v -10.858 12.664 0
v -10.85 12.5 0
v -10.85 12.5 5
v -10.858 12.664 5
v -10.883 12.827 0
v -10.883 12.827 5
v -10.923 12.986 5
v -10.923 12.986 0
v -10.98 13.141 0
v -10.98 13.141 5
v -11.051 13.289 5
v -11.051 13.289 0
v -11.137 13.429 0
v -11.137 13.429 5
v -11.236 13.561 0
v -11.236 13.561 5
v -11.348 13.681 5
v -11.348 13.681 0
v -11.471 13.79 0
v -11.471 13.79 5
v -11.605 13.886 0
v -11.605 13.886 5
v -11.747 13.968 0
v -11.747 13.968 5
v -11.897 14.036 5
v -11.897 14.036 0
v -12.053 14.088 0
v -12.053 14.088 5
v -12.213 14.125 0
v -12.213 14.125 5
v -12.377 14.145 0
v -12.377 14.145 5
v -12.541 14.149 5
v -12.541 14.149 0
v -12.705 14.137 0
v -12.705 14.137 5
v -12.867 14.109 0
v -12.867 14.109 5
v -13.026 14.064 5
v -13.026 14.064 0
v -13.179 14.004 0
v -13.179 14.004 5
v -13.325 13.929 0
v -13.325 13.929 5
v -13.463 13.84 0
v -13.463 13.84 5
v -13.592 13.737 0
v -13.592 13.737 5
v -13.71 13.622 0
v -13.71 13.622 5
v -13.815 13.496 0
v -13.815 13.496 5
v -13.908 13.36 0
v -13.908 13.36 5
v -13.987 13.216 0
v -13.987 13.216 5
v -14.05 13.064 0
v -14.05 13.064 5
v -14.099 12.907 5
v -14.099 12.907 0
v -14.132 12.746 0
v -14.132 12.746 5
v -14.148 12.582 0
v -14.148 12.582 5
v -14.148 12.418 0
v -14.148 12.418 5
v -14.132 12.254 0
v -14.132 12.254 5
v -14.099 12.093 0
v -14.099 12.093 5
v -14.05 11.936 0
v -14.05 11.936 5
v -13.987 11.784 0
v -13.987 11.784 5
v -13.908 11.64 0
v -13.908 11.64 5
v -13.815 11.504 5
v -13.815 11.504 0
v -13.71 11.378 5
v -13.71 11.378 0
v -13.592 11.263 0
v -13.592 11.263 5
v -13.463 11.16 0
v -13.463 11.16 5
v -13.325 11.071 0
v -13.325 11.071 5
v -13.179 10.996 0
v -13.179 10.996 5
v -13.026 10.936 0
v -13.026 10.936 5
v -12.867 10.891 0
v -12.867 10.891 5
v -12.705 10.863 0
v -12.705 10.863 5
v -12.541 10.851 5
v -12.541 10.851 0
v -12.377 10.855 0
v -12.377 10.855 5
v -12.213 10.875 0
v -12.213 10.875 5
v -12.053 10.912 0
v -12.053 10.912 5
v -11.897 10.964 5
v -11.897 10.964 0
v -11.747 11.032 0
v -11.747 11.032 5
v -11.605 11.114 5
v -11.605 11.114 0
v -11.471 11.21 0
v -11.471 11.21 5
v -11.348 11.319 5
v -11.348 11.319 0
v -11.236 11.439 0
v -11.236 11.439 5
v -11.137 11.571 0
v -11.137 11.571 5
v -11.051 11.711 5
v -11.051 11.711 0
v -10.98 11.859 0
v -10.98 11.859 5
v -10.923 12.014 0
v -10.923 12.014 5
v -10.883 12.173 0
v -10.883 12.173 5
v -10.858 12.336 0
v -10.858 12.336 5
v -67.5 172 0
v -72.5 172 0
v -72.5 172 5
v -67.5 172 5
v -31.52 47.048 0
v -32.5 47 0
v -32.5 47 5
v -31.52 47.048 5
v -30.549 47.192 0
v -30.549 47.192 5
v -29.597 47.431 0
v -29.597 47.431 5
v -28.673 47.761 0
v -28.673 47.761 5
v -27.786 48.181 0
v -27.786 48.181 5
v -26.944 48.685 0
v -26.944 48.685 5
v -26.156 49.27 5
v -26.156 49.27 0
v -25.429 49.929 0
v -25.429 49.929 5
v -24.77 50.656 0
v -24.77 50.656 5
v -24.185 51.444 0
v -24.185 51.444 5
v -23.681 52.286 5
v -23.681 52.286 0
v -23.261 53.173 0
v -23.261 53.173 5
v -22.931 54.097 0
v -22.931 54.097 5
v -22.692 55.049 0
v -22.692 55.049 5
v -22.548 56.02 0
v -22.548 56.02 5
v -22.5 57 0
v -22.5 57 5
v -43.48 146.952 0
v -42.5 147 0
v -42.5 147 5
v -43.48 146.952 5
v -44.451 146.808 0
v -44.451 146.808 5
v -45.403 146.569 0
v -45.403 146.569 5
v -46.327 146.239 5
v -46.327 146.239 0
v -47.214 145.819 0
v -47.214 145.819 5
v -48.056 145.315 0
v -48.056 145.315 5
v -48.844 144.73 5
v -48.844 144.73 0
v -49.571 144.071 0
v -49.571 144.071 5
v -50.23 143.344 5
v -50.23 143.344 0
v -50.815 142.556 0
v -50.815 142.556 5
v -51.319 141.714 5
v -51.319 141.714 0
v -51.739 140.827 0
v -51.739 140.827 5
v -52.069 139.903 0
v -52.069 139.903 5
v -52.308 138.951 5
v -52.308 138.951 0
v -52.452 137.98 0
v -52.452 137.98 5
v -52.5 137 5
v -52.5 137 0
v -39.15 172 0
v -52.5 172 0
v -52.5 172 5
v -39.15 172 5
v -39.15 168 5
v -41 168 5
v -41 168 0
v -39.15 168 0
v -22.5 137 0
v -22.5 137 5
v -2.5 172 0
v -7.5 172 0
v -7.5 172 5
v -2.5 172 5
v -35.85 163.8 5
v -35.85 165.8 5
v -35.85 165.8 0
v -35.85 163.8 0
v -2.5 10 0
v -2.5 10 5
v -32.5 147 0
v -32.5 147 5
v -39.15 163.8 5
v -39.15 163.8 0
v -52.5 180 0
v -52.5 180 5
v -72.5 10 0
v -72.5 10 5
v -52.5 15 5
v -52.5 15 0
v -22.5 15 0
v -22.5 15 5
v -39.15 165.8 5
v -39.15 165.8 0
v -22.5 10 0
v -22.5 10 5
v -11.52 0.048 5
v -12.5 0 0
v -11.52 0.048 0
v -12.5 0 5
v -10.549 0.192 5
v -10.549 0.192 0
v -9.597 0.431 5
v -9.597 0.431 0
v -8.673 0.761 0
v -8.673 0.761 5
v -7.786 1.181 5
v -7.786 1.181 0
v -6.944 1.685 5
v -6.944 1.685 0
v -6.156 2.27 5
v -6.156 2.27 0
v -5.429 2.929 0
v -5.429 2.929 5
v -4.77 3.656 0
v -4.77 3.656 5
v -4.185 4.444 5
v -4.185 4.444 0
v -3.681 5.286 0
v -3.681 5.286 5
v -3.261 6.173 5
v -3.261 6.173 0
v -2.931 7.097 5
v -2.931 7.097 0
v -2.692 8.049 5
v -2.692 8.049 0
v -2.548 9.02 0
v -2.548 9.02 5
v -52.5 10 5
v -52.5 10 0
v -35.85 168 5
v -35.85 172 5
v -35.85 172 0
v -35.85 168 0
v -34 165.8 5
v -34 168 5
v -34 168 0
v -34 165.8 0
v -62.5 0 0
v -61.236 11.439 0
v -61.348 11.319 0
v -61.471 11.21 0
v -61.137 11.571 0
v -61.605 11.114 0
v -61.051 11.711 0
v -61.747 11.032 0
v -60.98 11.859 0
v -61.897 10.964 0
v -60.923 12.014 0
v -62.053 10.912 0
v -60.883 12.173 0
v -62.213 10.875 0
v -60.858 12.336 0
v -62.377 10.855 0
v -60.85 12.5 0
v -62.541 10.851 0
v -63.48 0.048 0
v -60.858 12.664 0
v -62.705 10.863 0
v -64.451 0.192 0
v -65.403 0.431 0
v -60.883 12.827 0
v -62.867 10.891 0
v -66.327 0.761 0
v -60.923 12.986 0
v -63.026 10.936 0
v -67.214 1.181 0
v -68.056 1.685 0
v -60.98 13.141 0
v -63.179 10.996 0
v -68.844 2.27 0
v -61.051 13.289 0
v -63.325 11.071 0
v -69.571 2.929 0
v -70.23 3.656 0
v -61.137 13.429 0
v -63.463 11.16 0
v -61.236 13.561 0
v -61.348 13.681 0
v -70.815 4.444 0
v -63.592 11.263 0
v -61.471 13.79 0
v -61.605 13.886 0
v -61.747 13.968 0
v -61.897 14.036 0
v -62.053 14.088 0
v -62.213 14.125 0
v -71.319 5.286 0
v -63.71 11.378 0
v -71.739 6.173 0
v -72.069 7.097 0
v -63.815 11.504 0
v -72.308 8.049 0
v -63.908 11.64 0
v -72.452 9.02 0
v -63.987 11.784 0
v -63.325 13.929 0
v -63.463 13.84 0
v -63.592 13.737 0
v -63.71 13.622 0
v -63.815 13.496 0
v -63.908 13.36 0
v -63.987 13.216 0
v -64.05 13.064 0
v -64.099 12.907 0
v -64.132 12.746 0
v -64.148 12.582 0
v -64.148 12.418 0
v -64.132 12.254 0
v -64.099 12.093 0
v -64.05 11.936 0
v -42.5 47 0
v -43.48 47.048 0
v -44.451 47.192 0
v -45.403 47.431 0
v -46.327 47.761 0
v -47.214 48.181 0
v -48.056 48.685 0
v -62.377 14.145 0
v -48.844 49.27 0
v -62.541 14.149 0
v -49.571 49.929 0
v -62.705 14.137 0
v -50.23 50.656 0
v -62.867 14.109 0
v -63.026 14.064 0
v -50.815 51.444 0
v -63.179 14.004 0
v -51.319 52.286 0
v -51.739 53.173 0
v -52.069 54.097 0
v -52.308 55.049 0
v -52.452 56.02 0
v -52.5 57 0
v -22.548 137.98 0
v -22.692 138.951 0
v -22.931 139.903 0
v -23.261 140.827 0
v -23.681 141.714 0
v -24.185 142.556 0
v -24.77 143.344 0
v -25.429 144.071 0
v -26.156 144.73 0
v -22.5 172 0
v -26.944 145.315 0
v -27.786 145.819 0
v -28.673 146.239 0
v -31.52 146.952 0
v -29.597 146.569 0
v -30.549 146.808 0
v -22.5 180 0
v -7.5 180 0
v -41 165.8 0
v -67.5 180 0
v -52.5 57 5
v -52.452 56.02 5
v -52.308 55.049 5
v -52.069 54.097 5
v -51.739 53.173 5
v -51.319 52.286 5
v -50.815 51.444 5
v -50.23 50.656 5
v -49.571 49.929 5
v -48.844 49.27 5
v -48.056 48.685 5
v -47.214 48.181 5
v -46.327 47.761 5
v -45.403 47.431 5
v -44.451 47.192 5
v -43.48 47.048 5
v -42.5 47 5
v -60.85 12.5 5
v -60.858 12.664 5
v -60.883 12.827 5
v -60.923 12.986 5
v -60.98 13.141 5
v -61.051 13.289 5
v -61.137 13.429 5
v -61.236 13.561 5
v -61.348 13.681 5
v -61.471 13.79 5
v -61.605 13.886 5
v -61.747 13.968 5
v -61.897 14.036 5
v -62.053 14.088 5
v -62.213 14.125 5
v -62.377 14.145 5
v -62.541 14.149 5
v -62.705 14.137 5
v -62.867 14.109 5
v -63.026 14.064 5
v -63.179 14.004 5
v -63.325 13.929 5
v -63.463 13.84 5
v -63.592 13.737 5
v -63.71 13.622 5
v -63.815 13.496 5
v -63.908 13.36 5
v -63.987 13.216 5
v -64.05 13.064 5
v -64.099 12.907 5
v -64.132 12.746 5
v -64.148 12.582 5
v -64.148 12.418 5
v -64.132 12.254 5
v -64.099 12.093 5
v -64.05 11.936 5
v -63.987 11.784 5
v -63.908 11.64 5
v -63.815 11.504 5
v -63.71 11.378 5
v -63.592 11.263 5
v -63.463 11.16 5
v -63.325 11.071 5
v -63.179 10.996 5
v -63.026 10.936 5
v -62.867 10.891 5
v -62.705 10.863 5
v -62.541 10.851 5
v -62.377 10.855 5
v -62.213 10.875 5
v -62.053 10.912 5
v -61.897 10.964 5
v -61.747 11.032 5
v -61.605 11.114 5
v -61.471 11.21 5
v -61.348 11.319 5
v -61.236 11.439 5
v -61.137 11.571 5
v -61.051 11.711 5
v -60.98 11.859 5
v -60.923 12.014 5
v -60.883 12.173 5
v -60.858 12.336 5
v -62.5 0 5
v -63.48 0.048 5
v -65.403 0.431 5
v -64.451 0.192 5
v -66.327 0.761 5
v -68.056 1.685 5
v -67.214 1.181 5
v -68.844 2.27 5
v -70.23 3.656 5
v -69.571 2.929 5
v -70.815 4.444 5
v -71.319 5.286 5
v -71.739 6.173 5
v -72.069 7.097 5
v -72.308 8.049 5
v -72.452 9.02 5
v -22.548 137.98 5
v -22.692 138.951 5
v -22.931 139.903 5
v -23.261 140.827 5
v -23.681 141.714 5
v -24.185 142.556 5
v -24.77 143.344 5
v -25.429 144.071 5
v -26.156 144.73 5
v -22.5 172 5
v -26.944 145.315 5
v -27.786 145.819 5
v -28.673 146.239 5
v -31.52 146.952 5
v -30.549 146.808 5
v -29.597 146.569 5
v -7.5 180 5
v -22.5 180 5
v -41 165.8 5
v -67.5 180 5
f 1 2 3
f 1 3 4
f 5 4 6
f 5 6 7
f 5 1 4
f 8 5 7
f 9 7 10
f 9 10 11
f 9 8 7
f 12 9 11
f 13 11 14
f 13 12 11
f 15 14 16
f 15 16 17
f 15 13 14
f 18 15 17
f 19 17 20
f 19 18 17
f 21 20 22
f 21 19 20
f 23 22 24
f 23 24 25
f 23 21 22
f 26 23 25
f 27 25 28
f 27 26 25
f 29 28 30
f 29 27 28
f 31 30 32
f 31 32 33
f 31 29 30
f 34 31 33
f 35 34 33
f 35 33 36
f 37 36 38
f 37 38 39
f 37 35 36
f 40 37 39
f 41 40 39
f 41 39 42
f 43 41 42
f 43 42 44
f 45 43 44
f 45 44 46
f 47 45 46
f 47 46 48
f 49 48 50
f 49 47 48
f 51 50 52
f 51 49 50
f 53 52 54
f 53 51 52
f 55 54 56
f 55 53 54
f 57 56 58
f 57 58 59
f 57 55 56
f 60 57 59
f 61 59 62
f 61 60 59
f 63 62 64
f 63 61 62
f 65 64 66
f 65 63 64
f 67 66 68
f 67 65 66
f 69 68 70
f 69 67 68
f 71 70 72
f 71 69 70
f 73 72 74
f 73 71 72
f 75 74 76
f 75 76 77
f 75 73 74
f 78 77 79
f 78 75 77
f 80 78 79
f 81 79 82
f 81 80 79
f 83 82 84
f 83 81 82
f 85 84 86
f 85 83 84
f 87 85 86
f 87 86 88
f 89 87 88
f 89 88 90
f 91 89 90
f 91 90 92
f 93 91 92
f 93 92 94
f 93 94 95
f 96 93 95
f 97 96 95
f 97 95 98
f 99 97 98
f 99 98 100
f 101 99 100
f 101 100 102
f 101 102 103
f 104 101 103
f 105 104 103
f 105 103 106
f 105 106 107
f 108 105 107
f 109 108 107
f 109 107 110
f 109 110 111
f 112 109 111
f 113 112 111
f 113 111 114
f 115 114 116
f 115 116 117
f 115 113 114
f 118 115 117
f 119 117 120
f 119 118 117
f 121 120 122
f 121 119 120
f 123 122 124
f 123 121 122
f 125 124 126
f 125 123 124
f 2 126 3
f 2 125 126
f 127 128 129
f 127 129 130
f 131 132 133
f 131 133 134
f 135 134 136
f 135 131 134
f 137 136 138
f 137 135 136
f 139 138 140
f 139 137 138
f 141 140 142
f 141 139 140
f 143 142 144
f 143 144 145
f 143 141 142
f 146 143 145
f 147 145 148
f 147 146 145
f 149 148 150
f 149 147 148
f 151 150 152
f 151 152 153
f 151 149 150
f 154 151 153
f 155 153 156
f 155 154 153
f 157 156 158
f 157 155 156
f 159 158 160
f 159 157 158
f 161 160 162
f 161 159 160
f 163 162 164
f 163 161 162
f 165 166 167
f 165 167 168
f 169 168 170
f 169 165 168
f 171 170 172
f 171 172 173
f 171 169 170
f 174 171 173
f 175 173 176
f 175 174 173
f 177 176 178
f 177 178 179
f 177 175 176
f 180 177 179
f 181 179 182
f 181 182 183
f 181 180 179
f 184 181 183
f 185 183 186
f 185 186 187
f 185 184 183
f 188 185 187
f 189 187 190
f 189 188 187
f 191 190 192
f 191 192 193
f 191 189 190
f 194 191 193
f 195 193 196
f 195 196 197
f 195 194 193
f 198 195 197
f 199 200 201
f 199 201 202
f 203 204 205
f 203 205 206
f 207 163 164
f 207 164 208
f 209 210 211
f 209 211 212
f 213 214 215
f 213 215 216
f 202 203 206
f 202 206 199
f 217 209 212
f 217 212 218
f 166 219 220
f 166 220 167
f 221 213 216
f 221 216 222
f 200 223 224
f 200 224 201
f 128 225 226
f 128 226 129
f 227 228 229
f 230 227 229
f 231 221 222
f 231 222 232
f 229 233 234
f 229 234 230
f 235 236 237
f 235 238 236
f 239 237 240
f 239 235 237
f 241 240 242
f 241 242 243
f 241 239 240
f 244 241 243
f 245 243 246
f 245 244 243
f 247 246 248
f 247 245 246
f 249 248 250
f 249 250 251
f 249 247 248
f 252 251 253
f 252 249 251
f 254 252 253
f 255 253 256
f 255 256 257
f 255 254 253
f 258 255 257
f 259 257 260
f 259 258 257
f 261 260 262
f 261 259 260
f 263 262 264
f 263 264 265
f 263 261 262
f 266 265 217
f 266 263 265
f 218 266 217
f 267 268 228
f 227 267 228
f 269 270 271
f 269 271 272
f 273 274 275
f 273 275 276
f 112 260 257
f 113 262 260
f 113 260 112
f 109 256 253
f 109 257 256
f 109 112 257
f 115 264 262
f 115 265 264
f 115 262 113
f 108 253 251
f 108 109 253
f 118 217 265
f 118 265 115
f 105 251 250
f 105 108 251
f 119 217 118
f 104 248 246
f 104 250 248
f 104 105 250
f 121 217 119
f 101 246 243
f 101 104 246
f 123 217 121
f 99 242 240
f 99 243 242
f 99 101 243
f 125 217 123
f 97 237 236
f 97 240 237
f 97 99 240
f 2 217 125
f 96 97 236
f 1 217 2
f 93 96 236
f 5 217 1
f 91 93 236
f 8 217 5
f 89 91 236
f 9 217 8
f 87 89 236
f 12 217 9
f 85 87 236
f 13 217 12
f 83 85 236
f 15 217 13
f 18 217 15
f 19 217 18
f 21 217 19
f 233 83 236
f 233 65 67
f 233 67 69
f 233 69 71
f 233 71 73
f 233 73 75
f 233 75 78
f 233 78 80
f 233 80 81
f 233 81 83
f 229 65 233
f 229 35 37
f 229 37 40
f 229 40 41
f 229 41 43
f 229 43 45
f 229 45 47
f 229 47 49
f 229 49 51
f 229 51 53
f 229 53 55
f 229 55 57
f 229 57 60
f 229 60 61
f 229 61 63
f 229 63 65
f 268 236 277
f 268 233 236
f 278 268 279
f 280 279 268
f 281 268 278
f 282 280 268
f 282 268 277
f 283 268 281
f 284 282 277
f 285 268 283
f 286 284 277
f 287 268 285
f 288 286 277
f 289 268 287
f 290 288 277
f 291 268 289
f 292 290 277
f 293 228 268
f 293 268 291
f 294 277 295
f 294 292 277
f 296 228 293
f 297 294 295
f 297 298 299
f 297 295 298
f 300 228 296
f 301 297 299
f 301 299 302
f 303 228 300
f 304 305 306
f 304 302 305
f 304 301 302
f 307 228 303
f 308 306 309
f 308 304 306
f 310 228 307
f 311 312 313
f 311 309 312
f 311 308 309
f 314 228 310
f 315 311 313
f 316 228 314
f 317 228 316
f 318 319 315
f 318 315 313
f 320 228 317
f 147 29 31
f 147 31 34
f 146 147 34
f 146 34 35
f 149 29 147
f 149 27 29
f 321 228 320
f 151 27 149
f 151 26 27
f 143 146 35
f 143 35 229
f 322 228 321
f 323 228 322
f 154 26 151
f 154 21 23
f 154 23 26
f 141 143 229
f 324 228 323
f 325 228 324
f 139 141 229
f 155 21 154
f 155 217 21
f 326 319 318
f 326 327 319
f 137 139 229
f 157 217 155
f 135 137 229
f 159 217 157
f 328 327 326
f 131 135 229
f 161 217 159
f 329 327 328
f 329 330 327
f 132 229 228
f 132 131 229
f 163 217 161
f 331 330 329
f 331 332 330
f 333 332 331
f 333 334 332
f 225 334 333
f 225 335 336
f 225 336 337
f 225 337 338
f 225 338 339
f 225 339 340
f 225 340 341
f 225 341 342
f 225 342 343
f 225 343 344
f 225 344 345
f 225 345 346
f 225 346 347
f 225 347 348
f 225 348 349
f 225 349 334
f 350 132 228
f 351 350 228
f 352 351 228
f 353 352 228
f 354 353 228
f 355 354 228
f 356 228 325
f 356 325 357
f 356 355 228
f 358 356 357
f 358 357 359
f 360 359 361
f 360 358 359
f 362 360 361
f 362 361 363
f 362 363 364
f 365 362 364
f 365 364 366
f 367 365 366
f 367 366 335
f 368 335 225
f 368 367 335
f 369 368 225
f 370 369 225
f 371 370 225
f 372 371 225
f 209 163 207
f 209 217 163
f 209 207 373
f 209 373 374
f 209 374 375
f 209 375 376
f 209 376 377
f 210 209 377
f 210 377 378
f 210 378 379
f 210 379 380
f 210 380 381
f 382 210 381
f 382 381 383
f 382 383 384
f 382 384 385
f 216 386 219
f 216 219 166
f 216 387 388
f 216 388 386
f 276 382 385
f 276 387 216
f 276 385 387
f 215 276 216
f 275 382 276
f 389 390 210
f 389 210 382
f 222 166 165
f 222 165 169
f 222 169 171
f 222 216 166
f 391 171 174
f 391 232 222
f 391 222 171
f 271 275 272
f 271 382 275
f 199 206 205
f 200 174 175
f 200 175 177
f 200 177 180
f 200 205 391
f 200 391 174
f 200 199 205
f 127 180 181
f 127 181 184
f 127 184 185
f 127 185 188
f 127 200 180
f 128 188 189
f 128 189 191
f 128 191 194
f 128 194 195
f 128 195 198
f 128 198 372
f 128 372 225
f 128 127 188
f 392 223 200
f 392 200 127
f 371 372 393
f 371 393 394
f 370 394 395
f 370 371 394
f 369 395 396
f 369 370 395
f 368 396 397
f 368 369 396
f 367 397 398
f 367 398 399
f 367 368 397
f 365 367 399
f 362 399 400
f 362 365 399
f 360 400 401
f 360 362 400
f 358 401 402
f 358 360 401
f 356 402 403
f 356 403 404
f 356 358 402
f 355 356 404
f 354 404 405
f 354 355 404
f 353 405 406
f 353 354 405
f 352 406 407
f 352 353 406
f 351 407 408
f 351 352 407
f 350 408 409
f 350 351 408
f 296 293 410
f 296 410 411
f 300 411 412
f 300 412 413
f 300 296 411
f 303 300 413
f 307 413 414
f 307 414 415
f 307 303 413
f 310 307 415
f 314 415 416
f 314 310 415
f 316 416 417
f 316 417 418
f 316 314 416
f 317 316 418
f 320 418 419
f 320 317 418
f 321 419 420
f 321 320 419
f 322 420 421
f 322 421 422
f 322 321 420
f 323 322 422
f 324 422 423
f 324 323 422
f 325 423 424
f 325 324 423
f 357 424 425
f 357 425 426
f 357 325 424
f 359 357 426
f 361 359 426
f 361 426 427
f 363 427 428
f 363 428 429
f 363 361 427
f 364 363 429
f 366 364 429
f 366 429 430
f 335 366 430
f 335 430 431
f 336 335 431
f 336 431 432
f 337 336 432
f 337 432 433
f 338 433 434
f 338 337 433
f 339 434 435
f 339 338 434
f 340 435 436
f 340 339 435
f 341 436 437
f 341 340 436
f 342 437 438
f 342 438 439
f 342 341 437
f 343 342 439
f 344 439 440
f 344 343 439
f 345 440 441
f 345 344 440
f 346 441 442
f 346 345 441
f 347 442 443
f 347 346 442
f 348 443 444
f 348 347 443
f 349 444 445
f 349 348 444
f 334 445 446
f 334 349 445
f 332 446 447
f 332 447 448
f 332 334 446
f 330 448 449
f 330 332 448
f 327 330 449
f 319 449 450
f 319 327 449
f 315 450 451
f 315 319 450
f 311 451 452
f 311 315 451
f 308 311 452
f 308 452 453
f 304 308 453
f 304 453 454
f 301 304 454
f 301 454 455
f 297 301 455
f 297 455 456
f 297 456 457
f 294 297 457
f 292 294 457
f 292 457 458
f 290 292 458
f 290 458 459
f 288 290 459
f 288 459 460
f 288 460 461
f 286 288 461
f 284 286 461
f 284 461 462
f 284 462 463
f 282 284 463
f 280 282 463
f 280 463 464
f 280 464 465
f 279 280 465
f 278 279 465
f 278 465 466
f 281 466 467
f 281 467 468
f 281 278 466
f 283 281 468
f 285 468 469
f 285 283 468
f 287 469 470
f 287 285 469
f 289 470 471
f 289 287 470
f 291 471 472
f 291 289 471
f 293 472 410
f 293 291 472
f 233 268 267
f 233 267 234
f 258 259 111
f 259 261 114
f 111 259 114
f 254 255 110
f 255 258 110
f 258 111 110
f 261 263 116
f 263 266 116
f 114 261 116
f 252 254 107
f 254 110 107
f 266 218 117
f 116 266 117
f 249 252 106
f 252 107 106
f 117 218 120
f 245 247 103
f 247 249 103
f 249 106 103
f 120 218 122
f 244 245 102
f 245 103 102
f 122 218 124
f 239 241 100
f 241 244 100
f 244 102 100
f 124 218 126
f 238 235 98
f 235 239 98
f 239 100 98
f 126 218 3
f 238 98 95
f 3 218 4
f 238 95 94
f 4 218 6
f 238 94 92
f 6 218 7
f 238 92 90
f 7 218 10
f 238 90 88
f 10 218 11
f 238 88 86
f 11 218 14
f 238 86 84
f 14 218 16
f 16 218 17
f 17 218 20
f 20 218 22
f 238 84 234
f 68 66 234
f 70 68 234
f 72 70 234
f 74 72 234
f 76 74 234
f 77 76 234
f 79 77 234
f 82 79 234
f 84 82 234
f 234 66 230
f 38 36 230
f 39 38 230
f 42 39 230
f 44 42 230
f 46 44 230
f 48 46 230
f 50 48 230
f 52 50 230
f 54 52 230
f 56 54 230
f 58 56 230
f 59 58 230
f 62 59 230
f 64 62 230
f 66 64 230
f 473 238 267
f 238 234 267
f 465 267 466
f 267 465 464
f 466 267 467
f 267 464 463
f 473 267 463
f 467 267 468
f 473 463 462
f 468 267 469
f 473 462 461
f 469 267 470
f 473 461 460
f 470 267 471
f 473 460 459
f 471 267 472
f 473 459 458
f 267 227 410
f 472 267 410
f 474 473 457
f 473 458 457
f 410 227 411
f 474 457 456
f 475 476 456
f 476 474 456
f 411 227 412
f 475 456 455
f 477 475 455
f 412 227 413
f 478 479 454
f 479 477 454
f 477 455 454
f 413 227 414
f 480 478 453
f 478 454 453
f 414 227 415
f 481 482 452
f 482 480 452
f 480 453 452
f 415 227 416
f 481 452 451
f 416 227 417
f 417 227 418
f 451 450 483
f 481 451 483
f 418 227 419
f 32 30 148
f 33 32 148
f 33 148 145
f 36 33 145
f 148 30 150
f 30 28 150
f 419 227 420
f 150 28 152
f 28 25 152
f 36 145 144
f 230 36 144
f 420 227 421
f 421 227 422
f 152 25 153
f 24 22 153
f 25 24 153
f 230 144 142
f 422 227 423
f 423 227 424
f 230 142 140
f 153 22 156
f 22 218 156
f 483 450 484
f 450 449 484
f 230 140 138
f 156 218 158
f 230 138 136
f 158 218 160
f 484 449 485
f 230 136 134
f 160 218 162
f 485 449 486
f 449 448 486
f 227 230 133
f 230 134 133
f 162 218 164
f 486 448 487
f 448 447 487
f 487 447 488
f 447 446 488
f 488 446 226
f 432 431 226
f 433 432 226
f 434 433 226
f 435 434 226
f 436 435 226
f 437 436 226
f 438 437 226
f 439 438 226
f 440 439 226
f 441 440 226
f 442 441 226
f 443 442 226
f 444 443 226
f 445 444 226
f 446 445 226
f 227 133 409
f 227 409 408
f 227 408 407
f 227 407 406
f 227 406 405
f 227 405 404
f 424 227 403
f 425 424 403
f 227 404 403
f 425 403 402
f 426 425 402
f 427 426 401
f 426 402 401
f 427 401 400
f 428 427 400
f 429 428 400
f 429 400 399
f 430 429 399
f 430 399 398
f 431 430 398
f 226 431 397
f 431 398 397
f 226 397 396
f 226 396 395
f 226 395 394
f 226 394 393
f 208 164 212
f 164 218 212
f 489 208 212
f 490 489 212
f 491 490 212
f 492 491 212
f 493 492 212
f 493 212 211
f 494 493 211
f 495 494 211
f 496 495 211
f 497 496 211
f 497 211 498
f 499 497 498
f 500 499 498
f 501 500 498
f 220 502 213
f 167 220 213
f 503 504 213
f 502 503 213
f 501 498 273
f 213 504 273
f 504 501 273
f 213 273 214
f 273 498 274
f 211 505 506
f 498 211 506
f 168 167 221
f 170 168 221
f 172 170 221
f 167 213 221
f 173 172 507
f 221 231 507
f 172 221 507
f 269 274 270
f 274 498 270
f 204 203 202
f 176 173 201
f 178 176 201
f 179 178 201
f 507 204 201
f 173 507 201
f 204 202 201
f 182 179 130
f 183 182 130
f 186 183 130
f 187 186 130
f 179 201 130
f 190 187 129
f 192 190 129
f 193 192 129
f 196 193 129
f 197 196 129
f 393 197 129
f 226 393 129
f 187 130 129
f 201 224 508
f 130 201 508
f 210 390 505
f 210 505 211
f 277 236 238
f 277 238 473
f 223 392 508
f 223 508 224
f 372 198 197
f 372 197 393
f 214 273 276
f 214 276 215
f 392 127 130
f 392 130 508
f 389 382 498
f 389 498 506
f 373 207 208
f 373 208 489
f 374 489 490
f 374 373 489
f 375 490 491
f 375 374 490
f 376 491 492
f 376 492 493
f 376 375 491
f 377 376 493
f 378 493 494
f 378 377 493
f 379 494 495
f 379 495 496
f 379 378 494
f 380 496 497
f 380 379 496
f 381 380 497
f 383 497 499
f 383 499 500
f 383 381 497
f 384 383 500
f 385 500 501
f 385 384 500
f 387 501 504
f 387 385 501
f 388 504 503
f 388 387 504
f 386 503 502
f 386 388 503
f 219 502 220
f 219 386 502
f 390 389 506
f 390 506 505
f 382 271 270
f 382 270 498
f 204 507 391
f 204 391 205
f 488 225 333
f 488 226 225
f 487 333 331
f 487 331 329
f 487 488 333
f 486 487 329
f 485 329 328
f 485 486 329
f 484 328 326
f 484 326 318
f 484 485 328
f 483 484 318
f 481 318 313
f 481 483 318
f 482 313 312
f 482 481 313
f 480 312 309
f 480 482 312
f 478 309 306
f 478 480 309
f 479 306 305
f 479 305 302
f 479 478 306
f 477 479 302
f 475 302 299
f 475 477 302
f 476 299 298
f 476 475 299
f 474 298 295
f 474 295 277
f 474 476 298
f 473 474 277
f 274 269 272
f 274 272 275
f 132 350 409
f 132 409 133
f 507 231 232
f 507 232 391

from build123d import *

# Parameters (mm, degrees)
SKETCH1_R           = 1.65
SKETCH1_W           = 30
SKETCH1_H           = 5
BOSS_EXTRUDE1_DEPTH = 5
CUT_EXTRUDE1_DEPTH  = 6
FILLET1_R           = 10


with BuildPart() as part:
    # Sketch1 → Boss-Extrude1 (new body)
    with BuildSketch(Plane.XY):
        Polygon((-52.5, 172), (-22.5, 172), (-22.5, 180), (-7.5, 180), (-7.5, 172), (-2.5, 172), (-2.5, 0), (-72.5, 0), (-72.5, 172), (-67.5, 172), (-67.5, 180), (-52.5, 180), align=None)
        with Locations((-62.5, 12.5)):
            Circle(SKETCH1_R, mode=Mode.SUBTRACT)
        with Locations((-12.5, 12.5)):
            Circle(SKETCH1_R, mode=Mode.SUBTRACT)
        with Locations((-37.5, 12.5)):
            Rectangle(SKETCH1_W, SKETCH1_H, mode=Mode.SUBTRACT)
        with BuildLine():
            Line((-32.5, 147), (-42.5, 147))
            ThreePointArc((-42.5, 147), (-49.571067812, 144.071067812), (-52.5, 137))
            Line((-52.5, 137), (-52.5, 57))
            ThreePointArc((-52.5, 57), (-49.571067812, 49.928932188), (-42.5, 47))
            Line((-42.5, 47), (-32.5, 47))
            ThreePointArc((-32.5, 47), (-25.428932188, 49.928932188), (-22.5, 57))
            Line((-22.5, 57), (-22.5, 137))
            ThreePointArc((-22.5, 137), (-25.428932188, 144.071067812), (-32.5, 147))
        make_face(mode=Mode.SUBTRACT)
    extrude(amount=BOSS_EXTRUDE1_DEPTH)

    # Sketch2 → Cut-Extrude1 (cut, through all)
    with BuildSketch(Plane.XY.offset(5)):
        Polygon((-35.85, 172), (-35.85, 168), (-34, 168), (-34, 165.8), (-35.85, 165.8), (-35.85, 163.8), (-39.15, 163.8), (-39.15, 165.8), (-41, 165.8), (-41, 168), (-39.15, 168), (-39.15, 172), align=None)
    extrude(amount=-CUT_EXTRUDE1_DEPTH, mode=Mode.SUBTRACT)

    # Fillet1
    fillet1_edges = [part.edges().sort_by_distance(p)[0] for p in [
        (-2.5, 0, 2.5),
        (-72.5, 0, 2.5),
    ]]
    fillet(fillet1_edges, radius=FILLET1_R)


solid = part.part
